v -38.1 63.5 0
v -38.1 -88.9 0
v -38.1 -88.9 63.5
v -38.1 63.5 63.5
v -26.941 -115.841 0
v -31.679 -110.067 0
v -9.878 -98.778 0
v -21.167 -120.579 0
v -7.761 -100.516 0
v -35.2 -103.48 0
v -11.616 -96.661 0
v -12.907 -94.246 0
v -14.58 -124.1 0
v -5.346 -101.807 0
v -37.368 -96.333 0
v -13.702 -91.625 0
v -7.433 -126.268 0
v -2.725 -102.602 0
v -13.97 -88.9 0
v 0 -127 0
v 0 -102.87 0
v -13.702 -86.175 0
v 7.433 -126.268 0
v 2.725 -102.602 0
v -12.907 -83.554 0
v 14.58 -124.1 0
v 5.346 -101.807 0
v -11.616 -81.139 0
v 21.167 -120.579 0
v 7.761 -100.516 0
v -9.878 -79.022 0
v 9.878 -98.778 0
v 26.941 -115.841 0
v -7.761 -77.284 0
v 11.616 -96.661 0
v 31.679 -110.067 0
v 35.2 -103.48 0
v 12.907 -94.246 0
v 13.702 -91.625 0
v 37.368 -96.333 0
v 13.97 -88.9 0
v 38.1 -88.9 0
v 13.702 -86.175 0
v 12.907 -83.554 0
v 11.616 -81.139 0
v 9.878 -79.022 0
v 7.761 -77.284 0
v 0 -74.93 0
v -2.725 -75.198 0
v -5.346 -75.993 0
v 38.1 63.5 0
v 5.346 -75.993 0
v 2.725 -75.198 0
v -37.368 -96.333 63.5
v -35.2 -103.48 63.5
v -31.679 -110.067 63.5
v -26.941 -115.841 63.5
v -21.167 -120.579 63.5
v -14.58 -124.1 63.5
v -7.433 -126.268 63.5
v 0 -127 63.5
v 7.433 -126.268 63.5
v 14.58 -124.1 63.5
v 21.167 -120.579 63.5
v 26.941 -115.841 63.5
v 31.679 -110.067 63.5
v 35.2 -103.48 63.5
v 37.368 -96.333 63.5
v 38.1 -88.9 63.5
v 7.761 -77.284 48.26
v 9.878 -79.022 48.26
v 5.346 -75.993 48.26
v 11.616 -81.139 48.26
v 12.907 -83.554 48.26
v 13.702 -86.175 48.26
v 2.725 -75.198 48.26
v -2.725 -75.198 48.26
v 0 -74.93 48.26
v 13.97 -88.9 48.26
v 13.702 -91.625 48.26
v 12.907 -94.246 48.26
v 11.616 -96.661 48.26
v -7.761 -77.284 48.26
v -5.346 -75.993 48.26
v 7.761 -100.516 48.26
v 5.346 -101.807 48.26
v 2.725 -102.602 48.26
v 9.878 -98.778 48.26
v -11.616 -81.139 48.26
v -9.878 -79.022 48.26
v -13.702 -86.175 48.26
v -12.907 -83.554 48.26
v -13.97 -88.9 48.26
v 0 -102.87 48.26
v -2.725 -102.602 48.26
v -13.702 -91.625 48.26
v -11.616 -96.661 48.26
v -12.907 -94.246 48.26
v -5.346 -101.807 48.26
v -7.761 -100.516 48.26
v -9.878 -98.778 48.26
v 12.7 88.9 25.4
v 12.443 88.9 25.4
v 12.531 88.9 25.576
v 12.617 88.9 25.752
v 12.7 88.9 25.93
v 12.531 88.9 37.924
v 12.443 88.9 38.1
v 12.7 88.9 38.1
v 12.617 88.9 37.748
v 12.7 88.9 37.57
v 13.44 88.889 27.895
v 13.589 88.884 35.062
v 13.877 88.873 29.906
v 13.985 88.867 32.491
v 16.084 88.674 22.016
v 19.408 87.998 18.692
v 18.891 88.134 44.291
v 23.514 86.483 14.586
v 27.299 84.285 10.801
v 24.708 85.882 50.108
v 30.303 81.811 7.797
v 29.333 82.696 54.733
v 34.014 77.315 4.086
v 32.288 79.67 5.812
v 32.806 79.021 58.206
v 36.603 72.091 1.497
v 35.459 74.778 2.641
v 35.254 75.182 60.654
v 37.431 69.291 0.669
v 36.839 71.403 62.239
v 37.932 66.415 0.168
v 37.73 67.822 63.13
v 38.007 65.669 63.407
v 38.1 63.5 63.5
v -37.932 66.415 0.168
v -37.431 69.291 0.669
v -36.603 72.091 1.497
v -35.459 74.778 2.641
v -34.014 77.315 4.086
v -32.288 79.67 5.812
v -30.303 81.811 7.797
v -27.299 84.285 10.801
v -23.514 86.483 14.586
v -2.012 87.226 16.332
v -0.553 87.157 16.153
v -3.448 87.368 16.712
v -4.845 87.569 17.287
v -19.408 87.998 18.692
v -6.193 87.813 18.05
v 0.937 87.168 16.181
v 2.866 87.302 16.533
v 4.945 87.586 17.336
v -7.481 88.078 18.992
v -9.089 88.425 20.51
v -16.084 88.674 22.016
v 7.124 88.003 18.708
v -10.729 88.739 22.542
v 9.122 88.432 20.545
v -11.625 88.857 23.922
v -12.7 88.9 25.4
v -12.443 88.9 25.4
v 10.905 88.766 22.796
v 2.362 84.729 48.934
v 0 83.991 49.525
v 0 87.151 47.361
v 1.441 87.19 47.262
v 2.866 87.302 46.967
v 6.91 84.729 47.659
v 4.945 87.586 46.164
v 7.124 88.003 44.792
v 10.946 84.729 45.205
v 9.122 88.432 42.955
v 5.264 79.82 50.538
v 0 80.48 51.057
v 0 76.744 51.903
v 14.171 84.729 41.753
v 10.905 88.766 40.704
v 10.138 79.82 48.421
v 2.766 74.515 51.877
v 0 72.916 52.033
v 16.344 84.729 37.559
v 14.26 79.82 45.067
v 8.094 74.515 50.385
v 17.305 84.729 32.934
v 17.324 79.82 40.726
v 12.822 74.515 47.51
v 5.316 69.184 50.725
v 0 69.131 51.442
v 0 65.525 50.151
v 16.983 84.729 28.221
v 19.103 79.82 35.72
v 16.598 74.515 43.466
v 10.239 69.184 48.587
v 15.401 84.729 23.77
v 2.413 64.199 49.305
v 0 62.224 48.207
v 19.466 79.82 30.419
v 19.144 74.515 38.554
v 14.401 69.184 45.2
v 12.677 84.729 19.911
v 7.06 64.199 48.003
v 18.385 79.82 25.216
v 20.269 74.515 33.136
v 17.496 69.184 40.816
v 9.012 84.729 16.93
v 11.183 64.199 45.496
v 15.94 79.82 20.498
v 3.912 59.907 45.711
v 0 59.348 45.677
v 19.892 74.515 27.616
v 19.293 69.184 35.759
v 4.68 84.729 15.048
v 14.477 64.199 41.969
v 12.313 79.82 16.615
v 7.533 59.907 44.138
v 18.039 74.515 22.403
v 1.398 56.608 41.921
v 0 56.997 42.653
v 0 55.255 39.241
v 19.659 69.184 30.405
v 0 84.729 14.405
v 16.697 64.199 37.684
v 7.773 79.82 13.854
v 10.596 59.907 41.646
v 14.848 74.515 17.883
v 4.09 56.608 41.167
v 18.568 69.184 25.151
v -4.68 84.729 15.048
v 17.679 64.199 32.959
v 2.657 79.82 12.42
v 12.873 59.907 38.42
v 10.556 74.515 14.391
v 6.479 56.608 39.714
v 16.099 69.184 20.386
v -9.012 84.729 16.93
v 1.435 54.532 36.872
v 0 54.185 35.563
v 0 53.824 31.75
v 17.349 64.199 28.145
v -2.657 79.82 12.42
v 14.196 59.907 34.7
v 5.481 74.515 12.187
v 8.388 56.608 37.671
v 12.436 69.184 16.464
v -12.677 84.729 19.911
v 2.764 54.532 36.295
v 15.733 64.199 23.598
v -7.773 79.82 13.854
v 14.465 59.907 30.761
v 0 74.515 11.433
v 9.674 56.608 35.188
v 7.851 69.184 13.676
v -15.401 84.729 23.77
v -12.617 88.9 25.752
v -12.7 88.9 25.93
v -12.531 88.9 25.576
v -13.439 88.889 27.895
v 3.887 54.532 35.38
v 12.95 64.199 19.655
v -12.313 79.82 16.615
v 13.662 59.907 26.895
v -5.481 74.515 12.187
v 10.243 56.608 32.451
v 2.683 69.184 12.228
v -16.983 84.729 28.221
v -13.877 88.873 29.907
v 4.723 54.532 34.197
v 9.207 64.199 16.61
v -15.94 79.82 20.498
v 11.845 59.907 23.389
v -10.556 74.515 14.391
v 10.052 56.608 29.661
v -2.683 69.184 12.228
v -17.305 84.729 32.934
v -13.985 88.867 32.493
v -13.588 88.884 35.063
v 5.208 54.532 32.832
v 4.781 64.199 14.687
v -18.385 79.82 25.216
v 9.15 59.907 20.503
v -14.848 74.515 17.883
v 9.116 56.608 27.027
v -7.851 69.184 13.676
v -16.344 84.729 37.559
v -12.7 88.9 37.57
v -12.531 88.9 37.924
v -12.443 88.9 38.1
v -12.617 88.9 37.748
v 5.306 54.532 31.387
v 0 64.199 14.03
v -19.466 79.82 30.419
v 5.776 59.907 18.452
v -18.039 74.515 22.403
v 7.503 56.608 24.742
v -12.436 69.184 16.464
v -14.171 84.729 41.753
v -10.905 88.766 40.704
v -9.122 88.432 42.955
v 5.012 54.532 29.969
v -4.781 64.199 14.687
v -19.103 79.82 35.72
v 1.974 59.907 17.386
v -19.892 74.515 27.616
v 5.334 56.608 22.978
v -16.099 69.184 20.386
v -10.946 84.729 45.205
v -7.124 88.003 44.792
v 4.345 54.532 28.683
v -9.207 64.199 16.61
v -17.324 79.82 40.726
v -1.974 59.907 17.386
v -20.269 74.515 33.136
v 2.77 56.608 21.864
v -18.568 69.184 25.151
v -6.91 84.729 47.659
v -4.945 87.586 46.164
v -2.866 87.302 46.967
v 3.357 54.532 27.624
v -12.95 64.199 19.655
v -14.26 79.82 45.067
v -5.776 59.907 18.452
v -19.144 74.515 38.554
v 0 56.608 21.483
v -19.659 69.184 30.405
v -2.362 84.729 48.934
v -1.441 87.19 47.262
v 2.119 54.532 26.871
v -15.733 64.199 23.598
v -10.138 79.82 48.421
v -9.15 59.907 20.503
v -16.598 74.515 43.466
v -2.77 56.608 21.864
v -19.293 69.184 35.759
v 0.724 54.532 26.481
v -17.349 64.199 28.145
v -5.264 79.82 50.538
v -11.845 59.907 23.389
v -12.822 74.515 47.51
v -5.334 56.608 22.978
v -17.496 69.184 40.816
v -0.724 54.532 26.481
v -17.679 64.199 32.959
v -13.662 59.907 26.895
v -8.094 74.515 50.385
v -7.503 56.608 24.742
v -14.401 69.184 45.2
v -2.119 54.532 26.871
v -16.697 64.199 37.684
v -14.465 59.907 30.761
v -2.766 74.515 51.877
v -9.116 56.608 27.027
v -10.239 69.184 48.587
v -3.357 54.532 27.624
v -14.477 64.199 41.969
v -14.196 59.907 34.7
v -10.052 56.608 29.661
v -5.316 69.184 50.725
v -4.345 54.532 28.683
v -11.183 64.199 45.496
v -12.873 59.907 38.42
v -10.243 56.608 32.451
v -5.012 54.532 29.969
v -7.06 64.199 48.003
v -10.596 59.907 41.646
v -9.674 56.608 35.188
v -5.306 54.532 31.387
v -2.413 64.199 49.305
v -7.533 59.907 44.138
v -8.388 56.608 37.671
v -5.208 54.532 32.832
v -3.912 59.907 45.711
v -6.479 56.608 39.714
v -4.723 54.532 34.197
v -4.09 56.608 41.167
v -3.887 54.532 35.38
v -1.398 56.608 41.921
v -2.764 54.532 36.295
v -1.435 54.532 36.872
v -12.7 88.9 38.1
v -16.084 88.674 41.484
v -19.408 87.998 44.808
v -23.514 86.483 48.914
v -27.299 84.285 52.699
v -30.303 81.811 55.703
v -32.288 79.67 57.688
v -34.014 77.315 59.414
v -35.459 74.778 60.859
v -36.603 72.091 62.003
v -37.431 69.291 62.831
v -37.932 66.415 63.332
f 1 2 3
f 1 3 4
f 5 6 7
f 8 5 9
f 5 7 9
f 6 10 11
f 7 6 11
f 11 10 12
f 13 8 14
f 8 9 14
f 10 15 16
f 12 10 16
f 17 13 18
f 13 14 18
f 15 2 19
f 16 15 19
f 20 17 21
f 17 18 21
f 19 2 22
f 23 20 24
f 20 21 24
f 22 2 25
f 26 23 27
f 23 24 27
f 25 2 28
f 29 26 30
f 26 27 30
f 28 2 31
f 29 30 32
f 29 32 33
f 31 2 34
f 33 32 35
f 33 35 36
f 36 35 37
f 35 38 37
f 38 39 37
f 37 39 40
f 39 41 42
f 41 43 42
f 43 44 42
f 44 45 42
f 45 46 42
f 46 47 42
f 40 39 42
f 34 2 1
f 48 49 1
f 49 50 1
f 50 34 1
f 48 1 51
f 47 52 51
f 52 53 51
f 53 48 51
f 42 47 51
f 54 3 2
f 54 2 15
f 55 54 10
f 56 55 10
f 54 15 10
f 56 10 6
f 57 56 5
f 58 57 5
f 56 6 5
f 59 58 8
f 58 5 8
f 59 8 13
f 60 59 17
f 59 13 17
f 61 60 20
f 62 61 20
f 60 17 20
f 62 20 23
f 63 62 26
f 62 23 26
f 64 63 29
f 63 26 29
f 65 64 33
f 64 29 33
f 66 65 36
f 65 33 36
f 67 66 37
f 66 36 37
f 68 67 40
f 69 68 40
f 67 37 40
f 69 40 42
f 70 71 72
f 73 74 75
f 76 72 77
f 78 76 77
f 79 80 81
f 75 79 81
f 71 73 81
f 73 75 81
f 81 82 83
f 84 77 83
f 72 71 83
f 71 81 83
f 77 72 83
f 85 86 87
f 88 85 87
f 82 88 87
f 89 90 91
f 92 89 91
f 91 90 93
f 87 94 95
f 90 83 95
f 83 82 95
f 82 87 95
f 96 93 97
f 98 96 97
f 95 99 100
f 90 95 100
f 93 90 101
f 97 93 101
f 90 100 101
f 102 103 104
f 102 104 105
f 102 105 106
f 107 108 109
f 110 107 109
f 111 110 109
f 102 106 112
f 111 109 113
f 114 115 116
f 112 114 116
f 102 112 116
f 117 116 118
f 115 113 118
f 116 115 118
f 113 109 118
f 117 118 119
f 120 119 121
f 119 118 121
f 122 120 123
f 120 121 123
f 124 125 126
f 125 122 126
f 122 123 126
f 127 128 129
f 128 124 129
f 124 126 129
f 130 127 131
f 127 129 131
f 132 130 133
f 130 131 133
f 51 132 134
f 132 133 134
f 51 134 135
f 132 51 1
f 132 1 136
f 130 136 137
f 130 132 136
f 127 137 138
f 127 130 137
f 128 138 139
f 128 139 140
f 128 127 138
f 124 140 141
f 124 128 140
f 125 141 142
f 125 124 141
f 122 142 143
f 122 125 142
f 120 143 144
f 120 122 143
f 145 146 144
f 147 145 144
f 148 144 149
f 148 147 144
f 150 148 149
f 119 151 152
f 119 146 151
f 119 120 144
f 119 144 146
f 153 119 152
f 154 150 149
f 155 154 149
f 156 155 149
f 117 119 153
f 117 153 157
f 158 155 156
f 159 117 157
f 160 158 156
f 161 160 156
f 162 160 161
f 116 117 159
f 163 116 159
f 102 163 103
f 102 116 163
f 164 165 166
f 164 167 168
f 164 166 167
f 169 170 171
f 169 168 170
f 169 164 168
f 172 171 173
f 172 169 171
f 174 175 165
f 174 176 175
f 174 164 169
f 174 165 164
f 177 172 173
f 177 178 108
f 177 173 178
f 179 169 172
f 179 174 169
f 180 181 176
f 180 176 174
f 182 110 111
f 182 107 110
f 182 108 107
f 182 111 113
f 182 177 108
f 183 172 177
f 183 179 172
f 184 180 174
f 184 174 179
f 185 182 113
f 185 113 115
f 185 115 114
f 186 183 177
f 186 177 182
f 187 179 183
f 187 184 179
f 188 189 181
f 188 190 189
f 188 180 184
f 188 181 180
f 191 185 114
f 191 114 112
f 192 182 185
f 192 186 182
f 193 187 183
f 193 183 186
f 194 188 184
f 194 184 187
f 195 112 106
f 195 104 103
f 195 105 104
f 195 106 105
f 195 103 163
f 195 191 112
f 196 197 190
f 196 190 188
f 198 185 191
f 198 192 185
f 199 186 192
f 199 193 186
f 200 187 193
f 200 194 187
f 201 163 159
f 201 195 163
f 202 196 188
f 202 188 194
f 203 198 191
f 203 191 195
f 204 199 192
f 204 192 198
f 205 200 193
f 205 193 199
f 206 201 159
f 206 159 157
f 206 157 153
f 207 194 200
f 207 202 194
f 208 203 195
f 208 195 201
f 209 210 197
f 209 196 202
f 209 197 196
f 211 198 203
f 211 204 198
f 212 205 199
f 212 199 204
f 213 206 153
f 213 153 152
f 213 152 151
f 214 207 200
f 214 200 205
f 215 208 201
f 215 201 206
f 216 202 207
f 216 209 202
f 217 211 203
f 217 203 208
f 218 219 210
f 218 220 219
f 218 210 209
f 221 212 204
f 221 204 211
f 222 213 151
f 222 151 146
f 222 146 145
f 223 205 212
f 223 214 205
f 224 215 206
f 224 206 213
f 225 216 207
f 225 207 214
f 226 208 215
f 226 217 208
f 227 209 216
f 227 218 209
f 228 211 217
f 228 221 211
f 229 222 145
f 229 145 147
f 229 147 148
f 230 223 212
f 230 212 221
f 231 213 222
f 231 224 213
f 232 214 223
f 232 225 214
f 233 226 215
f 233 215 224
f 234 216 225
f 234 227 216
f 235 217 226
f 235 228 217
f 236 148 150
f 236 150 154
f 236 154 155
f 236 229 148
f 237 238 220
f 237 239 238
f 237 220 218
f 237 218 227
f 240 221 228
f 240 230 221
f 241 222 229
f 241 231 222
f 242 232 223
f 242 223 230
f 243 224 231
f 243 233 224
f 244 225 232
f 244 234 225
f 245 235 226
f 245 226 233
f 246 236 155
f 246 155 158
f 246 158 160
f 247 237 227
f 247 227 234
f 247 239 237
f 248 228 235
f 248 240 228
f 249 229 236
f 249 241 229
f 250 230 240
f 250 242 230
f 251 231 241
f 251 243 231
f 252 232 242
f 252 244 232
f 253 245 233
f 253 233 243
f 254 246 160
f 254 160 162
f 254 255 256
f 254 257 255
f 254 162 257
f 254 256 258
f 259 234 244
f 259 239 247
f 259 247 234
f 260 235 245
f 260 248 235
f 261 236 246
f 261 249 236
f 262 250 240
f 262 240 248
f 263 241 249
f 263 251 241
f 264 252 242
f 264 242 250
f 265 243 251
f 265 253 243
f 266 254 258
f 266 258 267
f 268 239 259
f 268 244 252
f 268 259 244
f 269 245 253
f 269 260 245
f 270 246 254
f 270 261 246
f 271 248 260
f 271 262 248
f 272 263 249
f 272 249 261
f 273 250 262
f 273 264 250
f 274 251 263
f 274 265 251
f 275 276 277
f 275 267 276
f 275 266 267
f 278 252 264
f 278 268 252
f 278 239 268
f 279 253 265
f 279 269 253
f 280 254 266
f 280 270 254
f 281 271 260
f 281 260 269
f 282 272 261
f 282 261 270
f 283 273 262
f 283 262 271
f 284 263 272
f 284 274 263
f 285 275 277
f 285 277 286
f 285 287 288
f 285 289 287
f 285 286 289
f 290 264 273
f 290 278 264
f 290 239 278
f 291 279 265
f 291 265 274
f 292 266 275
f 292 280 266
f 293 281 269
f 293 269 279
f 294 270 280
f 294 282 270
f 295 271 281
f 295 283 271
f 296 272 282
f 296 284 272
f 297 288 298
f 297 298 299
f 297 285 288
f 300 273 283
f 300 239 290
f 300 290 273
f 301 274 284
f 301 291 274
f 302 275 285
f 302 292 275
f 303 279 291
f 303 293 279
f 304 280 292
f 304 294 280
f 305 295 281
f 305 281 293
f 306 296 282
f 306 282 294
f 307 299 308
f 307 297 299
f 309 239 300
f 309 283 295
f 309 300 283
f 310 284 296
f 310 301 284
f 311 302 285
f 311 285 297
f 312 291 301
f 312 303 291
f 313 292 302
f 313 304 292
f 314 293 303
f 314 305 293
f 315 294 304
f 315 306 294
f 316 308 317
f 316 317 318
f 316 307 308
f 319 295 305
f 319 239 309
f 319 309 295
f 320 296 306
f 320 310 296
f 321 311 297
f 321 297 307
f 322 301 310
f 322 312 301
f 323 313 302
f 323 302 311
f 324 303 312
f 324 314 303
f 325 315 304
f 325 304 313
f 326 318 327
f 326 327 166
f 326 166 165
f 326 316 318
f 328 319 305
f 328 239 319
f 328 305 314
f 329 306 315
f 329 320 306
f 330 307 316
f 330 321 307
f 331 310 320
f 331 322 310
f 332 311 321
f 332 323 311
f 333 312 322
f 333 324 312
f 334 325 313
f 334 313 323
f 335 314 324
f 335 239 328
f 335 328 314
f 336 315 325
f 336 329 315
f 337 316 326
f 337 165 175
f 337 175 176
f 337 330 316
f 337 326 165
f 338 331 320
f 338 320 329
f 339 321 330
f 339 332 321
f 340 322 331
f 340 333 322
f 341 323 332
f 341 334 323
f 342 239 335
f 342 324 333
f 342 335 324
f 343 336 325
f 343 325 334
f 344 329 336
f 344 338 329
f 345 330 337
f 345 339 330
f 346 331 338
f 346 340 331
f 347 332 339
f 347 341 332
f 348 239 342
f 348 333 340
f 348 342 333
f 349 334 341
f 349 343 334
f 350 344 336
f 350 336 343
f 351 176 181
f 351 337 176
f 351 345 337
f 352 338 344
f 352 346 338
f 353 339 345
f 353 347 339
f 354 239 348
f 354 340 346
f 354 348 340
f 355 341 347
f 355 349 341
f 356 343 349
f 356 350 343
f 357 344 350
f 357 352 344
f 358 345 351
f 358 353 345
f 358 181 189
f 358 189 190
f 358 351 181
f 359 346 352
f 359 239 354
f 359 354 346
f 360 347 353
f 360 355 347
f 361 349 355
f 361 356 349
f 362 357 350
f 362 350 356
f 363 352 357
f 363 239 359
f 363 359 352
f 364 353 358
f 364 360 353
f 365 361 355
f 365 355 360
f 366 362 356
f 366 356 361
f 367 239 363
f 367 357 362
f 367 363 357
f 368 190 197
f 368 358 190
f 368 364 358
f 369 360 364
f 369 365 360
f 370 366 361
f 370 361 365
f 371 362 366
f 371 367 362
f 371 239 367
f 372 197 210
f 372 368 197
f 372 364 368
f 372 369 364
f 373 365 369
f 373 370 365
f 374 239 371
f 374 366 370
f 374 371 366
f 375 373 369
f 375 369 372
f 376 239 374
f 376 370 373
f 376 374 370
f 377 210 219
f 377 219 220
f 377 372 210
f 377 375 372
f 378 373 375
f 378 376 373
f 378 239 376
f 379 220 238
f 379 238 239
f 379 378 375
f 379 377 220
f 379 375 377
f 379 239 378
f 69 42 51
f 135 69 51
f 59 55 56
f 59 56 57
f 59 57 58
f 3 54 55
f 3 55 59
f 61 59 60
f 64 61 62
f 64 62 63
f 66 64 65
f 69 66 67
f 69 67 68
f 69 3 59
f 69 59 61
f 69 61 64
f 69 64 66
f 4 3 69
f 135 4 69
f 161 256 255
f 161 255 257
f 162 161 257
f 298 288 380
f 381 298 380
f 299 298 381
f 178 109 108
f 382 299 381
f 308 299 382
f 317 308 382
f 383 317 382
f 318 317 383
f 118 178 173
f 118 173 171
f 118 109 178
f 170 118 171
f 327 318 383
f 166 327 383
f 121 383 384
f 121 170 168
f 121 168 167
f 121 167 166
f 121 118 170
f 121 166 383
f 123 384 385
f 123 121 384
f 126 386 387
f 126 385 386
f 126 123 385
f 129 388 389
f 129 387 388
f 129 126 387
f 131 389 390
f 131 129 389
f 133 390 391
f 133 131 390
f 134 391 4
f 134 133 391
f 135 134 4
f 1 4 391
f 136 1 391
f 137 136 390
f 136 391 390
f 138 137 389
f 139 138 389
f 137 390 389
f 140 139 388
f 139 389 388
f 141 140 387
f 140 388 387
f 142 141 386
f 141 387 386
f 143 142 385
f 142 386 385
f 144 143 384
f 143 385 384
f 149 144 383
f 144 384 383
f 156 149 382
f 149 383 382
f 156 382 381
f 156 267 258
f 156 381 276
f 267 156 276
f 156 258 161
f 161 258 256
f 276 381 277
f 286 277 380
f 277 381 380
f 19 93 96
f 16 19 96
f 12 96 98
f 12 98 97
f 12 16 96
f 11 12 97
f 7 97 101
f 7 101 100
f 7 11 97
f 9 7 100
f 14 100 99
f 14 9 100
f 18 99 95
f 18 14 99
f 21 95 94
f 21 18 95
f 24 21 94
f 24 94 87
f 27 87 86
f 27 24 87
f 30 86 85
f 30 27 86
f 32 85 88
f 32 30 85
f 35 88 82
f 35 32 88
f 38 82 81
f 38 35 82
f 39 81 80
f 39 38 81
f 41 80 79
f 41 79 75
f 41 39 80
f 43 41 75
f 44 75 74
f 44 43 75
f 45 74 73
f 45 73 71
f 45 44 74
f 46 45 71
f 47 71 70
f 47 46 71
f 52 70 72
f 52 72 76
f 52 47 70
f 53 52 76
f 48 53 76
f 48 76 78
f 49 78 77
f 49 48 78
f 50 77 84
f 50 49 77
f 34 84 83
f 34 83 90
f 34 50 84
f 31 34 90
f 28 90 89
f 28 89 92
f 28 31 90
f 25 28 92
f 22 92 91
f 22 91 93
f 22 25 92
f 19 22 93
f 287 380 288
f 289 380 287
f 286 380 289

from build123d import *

# Parameters (mm, degrees)
SKETCH1_W           = 76.2
SKETCH1_H           = 177.8
BOSS_EXTRUDE1_DEPTH = 63.5
SKETCH2_R           = 38.1
BOSS_EXTRUDE2_DEPTH = 63.5
SKETCH4_R           = 13.97
CUT_EXTRUDE1_DEPTH  = 48.26
FILLET2_R           = 25.4


with BuildPart() as part:
    # Sketch1 → Boss-Extrude1 (new body)
    with BuildSketch(Plane.XY):
        Rectangle(SKETCH1_W, SKETCH1_H)
    extrude(amount=BOSS_EXTRUDE1_DEPTH)

    # Sketch2 → Boss-Extrude2 (add, through all)
    with BuildSketch(Plane.XY):
        with Locations((0, -88.9)):
            Circle(SKETCH2_R)
    extrude(amount=BOSS_EXTRUDE2_DEPTH)

    # Sketch4 → Cut-Extrude1 (cut)
    with BuildSketch(Plane.XY):
        with Locations(Location((0, -88.9, 0), (0, 0, 180))):
            Circle(SKETCH4_R)
    extrude(amount=CUT_EXTRUDE1_DEPTH, mode=Mode.SUBTRACT)

    # Fillet2
    fillet2_edges = [part.edges().sort_by_distance(p)[0] for p in [
        (0, 88.9, 0),
        (-38.1, 88.9, 31.75),
        (38.1, 88.9, 31.75),
        (0, 88.9, 63.5),
    ]]
    fillet(fillet2_edges, radius=FILLET2_R)

    # Sketch5 → Cut-Revolve4 (revolve, cut)
    with BuildSketch(Plane(origin=(0, 0, 0), x_dir=(0, 0, -1), z_dir=(1, 0, 0))):
        with BuildLine():
            Line((-31.75, 53.823933451), (-31.75, 94.463933451))
            ThreePointArc((-31.75, 94.463933451), (-52.07, 74.143933451), (-31.75, 53.823933451))
        make_face()
    revolve(axis=Axis((0, 53.823933451, 31.75), (0, 1, 0)), mode=Mode.SUBTRACT)


solid = part.part
